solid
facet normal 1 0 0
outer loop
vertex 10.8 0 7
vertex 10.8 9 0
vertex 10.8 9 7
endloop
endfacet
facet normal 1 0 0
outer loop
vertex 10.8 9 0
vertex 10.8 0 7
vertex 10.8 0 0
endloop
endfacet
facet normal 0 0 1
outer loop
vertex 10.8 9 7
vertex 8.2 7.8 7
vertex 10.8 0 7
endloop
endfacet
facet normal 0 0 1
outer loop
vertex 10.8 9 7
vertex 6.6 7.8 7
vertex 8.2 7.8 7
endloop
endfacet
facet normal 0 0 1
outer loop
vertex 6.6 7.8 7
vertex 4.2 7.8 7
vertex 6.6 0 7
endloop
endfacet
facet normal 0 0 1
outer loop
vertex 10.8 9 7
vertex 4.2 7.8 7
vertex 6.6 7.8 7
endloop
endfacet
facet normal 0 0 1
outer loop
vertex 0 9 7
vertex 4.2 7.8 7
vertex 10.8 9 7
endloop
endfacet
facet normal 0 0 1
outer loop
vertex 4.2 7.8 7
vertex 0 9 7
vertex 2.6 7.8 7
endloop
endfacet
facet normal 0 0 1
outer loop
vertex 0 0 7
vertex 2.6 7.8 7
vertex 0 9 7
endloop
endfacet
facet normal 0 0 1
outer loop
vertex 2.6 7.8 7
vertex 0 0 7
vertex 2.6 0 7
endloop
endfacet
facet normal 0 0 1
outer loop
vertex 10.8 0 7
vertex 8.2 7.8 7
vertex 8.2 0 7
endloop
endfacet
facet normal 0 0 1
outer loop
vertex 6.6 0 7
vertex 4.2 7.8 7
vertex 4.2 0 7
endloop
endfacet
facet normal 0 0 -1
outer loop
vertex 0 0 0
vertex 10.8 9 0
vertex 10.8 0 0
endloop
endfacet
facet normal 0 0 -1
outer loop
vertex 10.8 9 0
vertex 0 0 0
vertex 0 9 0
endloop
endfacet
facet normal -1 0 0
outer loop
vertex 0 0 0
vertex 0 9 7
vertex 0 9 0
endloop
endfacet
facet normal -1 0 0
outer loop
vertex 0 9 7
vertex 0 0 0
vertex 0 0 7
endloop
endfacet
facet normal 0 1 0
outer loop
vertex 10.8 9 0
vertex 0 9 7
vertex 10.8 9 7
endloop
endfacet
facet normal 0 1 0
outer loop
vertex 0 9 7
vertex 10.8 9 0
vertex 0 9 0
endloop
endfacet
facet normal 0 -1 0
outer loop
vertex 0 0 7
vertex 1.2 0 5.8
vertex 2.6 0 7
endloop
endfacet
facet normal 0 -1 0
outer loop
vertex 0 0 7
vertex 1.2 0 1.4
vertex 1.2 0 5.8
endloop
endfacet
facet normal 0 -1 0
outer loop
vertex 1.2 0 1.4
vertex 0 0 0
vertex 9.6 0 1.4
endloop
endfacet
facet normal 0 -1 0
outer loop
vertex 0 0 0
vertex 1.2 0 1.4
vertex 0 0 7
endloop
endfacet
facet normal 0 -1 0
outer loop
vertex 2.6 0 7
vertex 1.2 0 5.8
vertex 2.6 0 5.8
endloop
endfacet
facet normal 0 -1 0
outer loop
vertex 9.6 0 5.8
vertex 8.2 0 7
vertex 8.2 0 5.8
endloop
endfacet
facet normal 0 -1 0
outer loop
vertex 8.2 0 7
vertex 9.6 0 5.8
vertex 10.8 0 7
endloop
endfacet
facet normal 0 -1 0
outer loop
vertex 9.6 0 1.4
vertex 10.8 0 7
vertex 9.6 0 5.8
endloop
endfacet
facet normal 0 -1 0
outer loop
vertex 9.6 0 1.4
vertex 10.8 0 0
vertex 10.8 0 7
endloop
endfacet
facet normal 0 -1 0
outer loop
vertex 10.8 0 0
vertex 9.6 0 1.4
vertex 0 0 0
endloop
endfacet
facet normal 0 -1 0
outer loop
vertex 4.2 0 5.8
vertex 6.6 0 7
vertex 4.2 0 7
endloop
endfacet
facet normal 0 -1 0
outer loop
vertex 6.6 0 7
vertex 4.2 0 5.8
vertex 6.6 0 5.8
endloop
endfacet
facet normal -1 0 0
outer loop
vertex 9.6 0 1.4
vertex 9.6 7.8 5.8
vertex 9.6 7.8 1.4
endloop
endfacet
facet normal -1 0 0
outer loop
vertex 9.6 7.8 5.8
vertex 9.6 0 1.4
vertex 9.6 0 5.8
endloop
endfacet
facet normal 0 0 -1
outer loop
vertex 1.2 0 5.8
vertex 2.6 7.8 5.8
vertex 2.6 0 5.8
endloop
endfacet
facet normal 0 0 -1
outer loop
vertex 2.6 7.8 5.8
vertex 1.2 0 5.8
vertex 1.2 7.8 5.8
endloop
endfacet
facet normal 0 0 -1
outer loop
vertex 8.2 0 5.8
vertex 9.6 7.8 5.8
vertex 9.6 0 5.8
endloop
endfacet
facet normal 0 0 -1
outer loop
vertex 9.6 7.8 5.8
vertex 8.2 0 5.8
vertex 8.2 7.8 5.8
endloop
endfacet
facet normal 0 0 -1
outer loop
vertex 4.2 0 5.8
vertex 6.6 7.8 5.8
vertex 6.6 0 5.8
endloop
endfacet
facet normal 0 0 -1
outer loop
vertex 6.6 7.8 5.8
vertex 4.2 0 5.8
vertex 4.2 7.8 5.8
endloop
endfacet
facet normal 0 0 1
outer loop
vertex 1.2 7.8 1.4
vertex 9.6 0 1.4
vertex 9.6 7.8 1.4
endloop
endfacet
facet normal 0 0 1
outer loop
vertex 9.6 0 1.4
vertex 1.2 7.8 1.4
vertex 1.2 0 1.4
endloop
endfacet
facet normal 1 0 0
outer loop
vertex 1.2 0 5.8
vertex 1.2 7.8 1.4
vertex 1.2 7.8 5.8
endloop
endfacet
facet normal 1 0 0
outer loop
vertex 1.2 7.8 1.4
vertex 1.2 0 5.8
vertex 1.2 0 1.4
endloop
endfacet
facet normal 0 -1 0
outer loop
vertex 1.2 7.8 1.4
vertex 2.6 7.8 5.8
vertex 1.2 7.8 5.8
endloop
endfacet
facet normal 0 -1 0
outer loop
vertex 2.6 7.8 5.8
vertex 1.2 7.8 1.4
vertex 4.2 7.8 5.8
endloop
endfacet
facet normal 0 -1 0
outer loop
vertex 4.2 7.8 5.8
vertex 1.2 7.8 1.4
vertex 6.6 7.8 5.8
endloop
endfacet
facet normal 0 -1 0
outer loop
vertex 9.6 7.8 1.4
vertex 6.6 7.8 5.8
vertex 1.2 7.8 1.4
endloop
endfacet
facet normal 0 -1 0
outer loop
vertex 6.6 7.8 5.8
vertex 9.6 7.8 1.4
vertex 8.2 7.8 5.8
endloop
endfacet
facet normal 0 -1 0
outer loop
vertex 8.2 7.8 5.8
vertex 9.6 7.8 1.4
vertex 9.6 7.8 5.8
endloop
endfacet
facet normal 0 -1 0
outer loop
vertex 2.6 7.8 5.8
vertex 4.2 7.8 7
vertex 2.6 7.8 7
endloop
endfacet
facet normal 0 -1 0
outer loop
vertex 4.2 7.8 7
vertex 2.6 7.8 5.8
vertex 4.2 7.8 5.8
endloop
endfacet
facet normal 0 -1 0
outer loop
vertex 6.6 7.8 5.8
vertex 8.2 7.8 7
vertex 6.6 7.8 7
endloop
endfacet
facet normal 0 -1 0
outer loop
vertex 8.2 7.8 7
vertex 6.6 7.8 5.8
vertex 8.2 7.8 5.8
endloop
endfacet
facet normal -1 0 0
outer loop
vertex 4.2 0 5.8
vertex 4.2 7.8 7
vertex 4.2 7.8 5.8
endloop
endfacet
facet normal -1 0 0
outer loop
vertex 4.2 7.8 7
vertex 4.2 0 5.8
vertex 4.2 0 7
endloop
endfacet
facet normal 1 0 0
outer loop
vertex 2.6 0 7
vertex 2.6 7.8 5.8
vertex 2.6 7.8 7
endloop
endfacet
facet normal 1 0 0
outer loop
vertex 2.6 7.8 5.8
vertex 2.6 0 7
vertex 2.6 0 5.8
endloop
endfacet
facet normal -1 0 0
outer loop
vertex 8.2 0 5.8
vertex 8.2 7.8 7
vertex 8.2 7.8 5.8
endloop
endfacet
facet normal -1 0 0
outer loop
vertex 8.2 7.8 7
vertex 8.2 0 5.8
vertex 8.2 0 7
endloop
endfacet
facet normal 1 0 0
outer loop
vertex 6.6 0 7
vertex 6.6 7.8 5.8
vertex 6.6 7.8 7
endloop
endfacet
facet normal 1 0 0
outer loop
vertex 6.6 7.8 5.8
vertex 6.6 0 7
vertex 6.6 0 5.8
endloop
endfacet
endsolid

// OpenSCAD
wall_size = 1.2;
bottom_height = 0.2;
connector_width = 8.4;
connector_length = 7.8;
connector_height = 4.4;
cutout_width = 1.6;
cutout_offset = 1.4;

difference() {
    cube([connector_width + (2 * wall_size), connector_length + wall_size, bottom_height + connector_height + (2 * wall_size)]);
    
    translate([wall_size, -1, bottom_height + wall_size])
        cube([connector_width, connector_length + 1, connector_height]);
    
    translate([wall_size + cutout_offset, -1, bottom_height + wall_size + connector_height - 1])
        cube([cutout_width, connector_length + 1, wall_size + 2]);
    
    translate([wall_size + connector_width - cutout_offset - cutout_width, -1, bottom_height + wall_size + connector_height - 1])
        cube([cutout_width, connector_length + 1, wall_size + 2]);
}
